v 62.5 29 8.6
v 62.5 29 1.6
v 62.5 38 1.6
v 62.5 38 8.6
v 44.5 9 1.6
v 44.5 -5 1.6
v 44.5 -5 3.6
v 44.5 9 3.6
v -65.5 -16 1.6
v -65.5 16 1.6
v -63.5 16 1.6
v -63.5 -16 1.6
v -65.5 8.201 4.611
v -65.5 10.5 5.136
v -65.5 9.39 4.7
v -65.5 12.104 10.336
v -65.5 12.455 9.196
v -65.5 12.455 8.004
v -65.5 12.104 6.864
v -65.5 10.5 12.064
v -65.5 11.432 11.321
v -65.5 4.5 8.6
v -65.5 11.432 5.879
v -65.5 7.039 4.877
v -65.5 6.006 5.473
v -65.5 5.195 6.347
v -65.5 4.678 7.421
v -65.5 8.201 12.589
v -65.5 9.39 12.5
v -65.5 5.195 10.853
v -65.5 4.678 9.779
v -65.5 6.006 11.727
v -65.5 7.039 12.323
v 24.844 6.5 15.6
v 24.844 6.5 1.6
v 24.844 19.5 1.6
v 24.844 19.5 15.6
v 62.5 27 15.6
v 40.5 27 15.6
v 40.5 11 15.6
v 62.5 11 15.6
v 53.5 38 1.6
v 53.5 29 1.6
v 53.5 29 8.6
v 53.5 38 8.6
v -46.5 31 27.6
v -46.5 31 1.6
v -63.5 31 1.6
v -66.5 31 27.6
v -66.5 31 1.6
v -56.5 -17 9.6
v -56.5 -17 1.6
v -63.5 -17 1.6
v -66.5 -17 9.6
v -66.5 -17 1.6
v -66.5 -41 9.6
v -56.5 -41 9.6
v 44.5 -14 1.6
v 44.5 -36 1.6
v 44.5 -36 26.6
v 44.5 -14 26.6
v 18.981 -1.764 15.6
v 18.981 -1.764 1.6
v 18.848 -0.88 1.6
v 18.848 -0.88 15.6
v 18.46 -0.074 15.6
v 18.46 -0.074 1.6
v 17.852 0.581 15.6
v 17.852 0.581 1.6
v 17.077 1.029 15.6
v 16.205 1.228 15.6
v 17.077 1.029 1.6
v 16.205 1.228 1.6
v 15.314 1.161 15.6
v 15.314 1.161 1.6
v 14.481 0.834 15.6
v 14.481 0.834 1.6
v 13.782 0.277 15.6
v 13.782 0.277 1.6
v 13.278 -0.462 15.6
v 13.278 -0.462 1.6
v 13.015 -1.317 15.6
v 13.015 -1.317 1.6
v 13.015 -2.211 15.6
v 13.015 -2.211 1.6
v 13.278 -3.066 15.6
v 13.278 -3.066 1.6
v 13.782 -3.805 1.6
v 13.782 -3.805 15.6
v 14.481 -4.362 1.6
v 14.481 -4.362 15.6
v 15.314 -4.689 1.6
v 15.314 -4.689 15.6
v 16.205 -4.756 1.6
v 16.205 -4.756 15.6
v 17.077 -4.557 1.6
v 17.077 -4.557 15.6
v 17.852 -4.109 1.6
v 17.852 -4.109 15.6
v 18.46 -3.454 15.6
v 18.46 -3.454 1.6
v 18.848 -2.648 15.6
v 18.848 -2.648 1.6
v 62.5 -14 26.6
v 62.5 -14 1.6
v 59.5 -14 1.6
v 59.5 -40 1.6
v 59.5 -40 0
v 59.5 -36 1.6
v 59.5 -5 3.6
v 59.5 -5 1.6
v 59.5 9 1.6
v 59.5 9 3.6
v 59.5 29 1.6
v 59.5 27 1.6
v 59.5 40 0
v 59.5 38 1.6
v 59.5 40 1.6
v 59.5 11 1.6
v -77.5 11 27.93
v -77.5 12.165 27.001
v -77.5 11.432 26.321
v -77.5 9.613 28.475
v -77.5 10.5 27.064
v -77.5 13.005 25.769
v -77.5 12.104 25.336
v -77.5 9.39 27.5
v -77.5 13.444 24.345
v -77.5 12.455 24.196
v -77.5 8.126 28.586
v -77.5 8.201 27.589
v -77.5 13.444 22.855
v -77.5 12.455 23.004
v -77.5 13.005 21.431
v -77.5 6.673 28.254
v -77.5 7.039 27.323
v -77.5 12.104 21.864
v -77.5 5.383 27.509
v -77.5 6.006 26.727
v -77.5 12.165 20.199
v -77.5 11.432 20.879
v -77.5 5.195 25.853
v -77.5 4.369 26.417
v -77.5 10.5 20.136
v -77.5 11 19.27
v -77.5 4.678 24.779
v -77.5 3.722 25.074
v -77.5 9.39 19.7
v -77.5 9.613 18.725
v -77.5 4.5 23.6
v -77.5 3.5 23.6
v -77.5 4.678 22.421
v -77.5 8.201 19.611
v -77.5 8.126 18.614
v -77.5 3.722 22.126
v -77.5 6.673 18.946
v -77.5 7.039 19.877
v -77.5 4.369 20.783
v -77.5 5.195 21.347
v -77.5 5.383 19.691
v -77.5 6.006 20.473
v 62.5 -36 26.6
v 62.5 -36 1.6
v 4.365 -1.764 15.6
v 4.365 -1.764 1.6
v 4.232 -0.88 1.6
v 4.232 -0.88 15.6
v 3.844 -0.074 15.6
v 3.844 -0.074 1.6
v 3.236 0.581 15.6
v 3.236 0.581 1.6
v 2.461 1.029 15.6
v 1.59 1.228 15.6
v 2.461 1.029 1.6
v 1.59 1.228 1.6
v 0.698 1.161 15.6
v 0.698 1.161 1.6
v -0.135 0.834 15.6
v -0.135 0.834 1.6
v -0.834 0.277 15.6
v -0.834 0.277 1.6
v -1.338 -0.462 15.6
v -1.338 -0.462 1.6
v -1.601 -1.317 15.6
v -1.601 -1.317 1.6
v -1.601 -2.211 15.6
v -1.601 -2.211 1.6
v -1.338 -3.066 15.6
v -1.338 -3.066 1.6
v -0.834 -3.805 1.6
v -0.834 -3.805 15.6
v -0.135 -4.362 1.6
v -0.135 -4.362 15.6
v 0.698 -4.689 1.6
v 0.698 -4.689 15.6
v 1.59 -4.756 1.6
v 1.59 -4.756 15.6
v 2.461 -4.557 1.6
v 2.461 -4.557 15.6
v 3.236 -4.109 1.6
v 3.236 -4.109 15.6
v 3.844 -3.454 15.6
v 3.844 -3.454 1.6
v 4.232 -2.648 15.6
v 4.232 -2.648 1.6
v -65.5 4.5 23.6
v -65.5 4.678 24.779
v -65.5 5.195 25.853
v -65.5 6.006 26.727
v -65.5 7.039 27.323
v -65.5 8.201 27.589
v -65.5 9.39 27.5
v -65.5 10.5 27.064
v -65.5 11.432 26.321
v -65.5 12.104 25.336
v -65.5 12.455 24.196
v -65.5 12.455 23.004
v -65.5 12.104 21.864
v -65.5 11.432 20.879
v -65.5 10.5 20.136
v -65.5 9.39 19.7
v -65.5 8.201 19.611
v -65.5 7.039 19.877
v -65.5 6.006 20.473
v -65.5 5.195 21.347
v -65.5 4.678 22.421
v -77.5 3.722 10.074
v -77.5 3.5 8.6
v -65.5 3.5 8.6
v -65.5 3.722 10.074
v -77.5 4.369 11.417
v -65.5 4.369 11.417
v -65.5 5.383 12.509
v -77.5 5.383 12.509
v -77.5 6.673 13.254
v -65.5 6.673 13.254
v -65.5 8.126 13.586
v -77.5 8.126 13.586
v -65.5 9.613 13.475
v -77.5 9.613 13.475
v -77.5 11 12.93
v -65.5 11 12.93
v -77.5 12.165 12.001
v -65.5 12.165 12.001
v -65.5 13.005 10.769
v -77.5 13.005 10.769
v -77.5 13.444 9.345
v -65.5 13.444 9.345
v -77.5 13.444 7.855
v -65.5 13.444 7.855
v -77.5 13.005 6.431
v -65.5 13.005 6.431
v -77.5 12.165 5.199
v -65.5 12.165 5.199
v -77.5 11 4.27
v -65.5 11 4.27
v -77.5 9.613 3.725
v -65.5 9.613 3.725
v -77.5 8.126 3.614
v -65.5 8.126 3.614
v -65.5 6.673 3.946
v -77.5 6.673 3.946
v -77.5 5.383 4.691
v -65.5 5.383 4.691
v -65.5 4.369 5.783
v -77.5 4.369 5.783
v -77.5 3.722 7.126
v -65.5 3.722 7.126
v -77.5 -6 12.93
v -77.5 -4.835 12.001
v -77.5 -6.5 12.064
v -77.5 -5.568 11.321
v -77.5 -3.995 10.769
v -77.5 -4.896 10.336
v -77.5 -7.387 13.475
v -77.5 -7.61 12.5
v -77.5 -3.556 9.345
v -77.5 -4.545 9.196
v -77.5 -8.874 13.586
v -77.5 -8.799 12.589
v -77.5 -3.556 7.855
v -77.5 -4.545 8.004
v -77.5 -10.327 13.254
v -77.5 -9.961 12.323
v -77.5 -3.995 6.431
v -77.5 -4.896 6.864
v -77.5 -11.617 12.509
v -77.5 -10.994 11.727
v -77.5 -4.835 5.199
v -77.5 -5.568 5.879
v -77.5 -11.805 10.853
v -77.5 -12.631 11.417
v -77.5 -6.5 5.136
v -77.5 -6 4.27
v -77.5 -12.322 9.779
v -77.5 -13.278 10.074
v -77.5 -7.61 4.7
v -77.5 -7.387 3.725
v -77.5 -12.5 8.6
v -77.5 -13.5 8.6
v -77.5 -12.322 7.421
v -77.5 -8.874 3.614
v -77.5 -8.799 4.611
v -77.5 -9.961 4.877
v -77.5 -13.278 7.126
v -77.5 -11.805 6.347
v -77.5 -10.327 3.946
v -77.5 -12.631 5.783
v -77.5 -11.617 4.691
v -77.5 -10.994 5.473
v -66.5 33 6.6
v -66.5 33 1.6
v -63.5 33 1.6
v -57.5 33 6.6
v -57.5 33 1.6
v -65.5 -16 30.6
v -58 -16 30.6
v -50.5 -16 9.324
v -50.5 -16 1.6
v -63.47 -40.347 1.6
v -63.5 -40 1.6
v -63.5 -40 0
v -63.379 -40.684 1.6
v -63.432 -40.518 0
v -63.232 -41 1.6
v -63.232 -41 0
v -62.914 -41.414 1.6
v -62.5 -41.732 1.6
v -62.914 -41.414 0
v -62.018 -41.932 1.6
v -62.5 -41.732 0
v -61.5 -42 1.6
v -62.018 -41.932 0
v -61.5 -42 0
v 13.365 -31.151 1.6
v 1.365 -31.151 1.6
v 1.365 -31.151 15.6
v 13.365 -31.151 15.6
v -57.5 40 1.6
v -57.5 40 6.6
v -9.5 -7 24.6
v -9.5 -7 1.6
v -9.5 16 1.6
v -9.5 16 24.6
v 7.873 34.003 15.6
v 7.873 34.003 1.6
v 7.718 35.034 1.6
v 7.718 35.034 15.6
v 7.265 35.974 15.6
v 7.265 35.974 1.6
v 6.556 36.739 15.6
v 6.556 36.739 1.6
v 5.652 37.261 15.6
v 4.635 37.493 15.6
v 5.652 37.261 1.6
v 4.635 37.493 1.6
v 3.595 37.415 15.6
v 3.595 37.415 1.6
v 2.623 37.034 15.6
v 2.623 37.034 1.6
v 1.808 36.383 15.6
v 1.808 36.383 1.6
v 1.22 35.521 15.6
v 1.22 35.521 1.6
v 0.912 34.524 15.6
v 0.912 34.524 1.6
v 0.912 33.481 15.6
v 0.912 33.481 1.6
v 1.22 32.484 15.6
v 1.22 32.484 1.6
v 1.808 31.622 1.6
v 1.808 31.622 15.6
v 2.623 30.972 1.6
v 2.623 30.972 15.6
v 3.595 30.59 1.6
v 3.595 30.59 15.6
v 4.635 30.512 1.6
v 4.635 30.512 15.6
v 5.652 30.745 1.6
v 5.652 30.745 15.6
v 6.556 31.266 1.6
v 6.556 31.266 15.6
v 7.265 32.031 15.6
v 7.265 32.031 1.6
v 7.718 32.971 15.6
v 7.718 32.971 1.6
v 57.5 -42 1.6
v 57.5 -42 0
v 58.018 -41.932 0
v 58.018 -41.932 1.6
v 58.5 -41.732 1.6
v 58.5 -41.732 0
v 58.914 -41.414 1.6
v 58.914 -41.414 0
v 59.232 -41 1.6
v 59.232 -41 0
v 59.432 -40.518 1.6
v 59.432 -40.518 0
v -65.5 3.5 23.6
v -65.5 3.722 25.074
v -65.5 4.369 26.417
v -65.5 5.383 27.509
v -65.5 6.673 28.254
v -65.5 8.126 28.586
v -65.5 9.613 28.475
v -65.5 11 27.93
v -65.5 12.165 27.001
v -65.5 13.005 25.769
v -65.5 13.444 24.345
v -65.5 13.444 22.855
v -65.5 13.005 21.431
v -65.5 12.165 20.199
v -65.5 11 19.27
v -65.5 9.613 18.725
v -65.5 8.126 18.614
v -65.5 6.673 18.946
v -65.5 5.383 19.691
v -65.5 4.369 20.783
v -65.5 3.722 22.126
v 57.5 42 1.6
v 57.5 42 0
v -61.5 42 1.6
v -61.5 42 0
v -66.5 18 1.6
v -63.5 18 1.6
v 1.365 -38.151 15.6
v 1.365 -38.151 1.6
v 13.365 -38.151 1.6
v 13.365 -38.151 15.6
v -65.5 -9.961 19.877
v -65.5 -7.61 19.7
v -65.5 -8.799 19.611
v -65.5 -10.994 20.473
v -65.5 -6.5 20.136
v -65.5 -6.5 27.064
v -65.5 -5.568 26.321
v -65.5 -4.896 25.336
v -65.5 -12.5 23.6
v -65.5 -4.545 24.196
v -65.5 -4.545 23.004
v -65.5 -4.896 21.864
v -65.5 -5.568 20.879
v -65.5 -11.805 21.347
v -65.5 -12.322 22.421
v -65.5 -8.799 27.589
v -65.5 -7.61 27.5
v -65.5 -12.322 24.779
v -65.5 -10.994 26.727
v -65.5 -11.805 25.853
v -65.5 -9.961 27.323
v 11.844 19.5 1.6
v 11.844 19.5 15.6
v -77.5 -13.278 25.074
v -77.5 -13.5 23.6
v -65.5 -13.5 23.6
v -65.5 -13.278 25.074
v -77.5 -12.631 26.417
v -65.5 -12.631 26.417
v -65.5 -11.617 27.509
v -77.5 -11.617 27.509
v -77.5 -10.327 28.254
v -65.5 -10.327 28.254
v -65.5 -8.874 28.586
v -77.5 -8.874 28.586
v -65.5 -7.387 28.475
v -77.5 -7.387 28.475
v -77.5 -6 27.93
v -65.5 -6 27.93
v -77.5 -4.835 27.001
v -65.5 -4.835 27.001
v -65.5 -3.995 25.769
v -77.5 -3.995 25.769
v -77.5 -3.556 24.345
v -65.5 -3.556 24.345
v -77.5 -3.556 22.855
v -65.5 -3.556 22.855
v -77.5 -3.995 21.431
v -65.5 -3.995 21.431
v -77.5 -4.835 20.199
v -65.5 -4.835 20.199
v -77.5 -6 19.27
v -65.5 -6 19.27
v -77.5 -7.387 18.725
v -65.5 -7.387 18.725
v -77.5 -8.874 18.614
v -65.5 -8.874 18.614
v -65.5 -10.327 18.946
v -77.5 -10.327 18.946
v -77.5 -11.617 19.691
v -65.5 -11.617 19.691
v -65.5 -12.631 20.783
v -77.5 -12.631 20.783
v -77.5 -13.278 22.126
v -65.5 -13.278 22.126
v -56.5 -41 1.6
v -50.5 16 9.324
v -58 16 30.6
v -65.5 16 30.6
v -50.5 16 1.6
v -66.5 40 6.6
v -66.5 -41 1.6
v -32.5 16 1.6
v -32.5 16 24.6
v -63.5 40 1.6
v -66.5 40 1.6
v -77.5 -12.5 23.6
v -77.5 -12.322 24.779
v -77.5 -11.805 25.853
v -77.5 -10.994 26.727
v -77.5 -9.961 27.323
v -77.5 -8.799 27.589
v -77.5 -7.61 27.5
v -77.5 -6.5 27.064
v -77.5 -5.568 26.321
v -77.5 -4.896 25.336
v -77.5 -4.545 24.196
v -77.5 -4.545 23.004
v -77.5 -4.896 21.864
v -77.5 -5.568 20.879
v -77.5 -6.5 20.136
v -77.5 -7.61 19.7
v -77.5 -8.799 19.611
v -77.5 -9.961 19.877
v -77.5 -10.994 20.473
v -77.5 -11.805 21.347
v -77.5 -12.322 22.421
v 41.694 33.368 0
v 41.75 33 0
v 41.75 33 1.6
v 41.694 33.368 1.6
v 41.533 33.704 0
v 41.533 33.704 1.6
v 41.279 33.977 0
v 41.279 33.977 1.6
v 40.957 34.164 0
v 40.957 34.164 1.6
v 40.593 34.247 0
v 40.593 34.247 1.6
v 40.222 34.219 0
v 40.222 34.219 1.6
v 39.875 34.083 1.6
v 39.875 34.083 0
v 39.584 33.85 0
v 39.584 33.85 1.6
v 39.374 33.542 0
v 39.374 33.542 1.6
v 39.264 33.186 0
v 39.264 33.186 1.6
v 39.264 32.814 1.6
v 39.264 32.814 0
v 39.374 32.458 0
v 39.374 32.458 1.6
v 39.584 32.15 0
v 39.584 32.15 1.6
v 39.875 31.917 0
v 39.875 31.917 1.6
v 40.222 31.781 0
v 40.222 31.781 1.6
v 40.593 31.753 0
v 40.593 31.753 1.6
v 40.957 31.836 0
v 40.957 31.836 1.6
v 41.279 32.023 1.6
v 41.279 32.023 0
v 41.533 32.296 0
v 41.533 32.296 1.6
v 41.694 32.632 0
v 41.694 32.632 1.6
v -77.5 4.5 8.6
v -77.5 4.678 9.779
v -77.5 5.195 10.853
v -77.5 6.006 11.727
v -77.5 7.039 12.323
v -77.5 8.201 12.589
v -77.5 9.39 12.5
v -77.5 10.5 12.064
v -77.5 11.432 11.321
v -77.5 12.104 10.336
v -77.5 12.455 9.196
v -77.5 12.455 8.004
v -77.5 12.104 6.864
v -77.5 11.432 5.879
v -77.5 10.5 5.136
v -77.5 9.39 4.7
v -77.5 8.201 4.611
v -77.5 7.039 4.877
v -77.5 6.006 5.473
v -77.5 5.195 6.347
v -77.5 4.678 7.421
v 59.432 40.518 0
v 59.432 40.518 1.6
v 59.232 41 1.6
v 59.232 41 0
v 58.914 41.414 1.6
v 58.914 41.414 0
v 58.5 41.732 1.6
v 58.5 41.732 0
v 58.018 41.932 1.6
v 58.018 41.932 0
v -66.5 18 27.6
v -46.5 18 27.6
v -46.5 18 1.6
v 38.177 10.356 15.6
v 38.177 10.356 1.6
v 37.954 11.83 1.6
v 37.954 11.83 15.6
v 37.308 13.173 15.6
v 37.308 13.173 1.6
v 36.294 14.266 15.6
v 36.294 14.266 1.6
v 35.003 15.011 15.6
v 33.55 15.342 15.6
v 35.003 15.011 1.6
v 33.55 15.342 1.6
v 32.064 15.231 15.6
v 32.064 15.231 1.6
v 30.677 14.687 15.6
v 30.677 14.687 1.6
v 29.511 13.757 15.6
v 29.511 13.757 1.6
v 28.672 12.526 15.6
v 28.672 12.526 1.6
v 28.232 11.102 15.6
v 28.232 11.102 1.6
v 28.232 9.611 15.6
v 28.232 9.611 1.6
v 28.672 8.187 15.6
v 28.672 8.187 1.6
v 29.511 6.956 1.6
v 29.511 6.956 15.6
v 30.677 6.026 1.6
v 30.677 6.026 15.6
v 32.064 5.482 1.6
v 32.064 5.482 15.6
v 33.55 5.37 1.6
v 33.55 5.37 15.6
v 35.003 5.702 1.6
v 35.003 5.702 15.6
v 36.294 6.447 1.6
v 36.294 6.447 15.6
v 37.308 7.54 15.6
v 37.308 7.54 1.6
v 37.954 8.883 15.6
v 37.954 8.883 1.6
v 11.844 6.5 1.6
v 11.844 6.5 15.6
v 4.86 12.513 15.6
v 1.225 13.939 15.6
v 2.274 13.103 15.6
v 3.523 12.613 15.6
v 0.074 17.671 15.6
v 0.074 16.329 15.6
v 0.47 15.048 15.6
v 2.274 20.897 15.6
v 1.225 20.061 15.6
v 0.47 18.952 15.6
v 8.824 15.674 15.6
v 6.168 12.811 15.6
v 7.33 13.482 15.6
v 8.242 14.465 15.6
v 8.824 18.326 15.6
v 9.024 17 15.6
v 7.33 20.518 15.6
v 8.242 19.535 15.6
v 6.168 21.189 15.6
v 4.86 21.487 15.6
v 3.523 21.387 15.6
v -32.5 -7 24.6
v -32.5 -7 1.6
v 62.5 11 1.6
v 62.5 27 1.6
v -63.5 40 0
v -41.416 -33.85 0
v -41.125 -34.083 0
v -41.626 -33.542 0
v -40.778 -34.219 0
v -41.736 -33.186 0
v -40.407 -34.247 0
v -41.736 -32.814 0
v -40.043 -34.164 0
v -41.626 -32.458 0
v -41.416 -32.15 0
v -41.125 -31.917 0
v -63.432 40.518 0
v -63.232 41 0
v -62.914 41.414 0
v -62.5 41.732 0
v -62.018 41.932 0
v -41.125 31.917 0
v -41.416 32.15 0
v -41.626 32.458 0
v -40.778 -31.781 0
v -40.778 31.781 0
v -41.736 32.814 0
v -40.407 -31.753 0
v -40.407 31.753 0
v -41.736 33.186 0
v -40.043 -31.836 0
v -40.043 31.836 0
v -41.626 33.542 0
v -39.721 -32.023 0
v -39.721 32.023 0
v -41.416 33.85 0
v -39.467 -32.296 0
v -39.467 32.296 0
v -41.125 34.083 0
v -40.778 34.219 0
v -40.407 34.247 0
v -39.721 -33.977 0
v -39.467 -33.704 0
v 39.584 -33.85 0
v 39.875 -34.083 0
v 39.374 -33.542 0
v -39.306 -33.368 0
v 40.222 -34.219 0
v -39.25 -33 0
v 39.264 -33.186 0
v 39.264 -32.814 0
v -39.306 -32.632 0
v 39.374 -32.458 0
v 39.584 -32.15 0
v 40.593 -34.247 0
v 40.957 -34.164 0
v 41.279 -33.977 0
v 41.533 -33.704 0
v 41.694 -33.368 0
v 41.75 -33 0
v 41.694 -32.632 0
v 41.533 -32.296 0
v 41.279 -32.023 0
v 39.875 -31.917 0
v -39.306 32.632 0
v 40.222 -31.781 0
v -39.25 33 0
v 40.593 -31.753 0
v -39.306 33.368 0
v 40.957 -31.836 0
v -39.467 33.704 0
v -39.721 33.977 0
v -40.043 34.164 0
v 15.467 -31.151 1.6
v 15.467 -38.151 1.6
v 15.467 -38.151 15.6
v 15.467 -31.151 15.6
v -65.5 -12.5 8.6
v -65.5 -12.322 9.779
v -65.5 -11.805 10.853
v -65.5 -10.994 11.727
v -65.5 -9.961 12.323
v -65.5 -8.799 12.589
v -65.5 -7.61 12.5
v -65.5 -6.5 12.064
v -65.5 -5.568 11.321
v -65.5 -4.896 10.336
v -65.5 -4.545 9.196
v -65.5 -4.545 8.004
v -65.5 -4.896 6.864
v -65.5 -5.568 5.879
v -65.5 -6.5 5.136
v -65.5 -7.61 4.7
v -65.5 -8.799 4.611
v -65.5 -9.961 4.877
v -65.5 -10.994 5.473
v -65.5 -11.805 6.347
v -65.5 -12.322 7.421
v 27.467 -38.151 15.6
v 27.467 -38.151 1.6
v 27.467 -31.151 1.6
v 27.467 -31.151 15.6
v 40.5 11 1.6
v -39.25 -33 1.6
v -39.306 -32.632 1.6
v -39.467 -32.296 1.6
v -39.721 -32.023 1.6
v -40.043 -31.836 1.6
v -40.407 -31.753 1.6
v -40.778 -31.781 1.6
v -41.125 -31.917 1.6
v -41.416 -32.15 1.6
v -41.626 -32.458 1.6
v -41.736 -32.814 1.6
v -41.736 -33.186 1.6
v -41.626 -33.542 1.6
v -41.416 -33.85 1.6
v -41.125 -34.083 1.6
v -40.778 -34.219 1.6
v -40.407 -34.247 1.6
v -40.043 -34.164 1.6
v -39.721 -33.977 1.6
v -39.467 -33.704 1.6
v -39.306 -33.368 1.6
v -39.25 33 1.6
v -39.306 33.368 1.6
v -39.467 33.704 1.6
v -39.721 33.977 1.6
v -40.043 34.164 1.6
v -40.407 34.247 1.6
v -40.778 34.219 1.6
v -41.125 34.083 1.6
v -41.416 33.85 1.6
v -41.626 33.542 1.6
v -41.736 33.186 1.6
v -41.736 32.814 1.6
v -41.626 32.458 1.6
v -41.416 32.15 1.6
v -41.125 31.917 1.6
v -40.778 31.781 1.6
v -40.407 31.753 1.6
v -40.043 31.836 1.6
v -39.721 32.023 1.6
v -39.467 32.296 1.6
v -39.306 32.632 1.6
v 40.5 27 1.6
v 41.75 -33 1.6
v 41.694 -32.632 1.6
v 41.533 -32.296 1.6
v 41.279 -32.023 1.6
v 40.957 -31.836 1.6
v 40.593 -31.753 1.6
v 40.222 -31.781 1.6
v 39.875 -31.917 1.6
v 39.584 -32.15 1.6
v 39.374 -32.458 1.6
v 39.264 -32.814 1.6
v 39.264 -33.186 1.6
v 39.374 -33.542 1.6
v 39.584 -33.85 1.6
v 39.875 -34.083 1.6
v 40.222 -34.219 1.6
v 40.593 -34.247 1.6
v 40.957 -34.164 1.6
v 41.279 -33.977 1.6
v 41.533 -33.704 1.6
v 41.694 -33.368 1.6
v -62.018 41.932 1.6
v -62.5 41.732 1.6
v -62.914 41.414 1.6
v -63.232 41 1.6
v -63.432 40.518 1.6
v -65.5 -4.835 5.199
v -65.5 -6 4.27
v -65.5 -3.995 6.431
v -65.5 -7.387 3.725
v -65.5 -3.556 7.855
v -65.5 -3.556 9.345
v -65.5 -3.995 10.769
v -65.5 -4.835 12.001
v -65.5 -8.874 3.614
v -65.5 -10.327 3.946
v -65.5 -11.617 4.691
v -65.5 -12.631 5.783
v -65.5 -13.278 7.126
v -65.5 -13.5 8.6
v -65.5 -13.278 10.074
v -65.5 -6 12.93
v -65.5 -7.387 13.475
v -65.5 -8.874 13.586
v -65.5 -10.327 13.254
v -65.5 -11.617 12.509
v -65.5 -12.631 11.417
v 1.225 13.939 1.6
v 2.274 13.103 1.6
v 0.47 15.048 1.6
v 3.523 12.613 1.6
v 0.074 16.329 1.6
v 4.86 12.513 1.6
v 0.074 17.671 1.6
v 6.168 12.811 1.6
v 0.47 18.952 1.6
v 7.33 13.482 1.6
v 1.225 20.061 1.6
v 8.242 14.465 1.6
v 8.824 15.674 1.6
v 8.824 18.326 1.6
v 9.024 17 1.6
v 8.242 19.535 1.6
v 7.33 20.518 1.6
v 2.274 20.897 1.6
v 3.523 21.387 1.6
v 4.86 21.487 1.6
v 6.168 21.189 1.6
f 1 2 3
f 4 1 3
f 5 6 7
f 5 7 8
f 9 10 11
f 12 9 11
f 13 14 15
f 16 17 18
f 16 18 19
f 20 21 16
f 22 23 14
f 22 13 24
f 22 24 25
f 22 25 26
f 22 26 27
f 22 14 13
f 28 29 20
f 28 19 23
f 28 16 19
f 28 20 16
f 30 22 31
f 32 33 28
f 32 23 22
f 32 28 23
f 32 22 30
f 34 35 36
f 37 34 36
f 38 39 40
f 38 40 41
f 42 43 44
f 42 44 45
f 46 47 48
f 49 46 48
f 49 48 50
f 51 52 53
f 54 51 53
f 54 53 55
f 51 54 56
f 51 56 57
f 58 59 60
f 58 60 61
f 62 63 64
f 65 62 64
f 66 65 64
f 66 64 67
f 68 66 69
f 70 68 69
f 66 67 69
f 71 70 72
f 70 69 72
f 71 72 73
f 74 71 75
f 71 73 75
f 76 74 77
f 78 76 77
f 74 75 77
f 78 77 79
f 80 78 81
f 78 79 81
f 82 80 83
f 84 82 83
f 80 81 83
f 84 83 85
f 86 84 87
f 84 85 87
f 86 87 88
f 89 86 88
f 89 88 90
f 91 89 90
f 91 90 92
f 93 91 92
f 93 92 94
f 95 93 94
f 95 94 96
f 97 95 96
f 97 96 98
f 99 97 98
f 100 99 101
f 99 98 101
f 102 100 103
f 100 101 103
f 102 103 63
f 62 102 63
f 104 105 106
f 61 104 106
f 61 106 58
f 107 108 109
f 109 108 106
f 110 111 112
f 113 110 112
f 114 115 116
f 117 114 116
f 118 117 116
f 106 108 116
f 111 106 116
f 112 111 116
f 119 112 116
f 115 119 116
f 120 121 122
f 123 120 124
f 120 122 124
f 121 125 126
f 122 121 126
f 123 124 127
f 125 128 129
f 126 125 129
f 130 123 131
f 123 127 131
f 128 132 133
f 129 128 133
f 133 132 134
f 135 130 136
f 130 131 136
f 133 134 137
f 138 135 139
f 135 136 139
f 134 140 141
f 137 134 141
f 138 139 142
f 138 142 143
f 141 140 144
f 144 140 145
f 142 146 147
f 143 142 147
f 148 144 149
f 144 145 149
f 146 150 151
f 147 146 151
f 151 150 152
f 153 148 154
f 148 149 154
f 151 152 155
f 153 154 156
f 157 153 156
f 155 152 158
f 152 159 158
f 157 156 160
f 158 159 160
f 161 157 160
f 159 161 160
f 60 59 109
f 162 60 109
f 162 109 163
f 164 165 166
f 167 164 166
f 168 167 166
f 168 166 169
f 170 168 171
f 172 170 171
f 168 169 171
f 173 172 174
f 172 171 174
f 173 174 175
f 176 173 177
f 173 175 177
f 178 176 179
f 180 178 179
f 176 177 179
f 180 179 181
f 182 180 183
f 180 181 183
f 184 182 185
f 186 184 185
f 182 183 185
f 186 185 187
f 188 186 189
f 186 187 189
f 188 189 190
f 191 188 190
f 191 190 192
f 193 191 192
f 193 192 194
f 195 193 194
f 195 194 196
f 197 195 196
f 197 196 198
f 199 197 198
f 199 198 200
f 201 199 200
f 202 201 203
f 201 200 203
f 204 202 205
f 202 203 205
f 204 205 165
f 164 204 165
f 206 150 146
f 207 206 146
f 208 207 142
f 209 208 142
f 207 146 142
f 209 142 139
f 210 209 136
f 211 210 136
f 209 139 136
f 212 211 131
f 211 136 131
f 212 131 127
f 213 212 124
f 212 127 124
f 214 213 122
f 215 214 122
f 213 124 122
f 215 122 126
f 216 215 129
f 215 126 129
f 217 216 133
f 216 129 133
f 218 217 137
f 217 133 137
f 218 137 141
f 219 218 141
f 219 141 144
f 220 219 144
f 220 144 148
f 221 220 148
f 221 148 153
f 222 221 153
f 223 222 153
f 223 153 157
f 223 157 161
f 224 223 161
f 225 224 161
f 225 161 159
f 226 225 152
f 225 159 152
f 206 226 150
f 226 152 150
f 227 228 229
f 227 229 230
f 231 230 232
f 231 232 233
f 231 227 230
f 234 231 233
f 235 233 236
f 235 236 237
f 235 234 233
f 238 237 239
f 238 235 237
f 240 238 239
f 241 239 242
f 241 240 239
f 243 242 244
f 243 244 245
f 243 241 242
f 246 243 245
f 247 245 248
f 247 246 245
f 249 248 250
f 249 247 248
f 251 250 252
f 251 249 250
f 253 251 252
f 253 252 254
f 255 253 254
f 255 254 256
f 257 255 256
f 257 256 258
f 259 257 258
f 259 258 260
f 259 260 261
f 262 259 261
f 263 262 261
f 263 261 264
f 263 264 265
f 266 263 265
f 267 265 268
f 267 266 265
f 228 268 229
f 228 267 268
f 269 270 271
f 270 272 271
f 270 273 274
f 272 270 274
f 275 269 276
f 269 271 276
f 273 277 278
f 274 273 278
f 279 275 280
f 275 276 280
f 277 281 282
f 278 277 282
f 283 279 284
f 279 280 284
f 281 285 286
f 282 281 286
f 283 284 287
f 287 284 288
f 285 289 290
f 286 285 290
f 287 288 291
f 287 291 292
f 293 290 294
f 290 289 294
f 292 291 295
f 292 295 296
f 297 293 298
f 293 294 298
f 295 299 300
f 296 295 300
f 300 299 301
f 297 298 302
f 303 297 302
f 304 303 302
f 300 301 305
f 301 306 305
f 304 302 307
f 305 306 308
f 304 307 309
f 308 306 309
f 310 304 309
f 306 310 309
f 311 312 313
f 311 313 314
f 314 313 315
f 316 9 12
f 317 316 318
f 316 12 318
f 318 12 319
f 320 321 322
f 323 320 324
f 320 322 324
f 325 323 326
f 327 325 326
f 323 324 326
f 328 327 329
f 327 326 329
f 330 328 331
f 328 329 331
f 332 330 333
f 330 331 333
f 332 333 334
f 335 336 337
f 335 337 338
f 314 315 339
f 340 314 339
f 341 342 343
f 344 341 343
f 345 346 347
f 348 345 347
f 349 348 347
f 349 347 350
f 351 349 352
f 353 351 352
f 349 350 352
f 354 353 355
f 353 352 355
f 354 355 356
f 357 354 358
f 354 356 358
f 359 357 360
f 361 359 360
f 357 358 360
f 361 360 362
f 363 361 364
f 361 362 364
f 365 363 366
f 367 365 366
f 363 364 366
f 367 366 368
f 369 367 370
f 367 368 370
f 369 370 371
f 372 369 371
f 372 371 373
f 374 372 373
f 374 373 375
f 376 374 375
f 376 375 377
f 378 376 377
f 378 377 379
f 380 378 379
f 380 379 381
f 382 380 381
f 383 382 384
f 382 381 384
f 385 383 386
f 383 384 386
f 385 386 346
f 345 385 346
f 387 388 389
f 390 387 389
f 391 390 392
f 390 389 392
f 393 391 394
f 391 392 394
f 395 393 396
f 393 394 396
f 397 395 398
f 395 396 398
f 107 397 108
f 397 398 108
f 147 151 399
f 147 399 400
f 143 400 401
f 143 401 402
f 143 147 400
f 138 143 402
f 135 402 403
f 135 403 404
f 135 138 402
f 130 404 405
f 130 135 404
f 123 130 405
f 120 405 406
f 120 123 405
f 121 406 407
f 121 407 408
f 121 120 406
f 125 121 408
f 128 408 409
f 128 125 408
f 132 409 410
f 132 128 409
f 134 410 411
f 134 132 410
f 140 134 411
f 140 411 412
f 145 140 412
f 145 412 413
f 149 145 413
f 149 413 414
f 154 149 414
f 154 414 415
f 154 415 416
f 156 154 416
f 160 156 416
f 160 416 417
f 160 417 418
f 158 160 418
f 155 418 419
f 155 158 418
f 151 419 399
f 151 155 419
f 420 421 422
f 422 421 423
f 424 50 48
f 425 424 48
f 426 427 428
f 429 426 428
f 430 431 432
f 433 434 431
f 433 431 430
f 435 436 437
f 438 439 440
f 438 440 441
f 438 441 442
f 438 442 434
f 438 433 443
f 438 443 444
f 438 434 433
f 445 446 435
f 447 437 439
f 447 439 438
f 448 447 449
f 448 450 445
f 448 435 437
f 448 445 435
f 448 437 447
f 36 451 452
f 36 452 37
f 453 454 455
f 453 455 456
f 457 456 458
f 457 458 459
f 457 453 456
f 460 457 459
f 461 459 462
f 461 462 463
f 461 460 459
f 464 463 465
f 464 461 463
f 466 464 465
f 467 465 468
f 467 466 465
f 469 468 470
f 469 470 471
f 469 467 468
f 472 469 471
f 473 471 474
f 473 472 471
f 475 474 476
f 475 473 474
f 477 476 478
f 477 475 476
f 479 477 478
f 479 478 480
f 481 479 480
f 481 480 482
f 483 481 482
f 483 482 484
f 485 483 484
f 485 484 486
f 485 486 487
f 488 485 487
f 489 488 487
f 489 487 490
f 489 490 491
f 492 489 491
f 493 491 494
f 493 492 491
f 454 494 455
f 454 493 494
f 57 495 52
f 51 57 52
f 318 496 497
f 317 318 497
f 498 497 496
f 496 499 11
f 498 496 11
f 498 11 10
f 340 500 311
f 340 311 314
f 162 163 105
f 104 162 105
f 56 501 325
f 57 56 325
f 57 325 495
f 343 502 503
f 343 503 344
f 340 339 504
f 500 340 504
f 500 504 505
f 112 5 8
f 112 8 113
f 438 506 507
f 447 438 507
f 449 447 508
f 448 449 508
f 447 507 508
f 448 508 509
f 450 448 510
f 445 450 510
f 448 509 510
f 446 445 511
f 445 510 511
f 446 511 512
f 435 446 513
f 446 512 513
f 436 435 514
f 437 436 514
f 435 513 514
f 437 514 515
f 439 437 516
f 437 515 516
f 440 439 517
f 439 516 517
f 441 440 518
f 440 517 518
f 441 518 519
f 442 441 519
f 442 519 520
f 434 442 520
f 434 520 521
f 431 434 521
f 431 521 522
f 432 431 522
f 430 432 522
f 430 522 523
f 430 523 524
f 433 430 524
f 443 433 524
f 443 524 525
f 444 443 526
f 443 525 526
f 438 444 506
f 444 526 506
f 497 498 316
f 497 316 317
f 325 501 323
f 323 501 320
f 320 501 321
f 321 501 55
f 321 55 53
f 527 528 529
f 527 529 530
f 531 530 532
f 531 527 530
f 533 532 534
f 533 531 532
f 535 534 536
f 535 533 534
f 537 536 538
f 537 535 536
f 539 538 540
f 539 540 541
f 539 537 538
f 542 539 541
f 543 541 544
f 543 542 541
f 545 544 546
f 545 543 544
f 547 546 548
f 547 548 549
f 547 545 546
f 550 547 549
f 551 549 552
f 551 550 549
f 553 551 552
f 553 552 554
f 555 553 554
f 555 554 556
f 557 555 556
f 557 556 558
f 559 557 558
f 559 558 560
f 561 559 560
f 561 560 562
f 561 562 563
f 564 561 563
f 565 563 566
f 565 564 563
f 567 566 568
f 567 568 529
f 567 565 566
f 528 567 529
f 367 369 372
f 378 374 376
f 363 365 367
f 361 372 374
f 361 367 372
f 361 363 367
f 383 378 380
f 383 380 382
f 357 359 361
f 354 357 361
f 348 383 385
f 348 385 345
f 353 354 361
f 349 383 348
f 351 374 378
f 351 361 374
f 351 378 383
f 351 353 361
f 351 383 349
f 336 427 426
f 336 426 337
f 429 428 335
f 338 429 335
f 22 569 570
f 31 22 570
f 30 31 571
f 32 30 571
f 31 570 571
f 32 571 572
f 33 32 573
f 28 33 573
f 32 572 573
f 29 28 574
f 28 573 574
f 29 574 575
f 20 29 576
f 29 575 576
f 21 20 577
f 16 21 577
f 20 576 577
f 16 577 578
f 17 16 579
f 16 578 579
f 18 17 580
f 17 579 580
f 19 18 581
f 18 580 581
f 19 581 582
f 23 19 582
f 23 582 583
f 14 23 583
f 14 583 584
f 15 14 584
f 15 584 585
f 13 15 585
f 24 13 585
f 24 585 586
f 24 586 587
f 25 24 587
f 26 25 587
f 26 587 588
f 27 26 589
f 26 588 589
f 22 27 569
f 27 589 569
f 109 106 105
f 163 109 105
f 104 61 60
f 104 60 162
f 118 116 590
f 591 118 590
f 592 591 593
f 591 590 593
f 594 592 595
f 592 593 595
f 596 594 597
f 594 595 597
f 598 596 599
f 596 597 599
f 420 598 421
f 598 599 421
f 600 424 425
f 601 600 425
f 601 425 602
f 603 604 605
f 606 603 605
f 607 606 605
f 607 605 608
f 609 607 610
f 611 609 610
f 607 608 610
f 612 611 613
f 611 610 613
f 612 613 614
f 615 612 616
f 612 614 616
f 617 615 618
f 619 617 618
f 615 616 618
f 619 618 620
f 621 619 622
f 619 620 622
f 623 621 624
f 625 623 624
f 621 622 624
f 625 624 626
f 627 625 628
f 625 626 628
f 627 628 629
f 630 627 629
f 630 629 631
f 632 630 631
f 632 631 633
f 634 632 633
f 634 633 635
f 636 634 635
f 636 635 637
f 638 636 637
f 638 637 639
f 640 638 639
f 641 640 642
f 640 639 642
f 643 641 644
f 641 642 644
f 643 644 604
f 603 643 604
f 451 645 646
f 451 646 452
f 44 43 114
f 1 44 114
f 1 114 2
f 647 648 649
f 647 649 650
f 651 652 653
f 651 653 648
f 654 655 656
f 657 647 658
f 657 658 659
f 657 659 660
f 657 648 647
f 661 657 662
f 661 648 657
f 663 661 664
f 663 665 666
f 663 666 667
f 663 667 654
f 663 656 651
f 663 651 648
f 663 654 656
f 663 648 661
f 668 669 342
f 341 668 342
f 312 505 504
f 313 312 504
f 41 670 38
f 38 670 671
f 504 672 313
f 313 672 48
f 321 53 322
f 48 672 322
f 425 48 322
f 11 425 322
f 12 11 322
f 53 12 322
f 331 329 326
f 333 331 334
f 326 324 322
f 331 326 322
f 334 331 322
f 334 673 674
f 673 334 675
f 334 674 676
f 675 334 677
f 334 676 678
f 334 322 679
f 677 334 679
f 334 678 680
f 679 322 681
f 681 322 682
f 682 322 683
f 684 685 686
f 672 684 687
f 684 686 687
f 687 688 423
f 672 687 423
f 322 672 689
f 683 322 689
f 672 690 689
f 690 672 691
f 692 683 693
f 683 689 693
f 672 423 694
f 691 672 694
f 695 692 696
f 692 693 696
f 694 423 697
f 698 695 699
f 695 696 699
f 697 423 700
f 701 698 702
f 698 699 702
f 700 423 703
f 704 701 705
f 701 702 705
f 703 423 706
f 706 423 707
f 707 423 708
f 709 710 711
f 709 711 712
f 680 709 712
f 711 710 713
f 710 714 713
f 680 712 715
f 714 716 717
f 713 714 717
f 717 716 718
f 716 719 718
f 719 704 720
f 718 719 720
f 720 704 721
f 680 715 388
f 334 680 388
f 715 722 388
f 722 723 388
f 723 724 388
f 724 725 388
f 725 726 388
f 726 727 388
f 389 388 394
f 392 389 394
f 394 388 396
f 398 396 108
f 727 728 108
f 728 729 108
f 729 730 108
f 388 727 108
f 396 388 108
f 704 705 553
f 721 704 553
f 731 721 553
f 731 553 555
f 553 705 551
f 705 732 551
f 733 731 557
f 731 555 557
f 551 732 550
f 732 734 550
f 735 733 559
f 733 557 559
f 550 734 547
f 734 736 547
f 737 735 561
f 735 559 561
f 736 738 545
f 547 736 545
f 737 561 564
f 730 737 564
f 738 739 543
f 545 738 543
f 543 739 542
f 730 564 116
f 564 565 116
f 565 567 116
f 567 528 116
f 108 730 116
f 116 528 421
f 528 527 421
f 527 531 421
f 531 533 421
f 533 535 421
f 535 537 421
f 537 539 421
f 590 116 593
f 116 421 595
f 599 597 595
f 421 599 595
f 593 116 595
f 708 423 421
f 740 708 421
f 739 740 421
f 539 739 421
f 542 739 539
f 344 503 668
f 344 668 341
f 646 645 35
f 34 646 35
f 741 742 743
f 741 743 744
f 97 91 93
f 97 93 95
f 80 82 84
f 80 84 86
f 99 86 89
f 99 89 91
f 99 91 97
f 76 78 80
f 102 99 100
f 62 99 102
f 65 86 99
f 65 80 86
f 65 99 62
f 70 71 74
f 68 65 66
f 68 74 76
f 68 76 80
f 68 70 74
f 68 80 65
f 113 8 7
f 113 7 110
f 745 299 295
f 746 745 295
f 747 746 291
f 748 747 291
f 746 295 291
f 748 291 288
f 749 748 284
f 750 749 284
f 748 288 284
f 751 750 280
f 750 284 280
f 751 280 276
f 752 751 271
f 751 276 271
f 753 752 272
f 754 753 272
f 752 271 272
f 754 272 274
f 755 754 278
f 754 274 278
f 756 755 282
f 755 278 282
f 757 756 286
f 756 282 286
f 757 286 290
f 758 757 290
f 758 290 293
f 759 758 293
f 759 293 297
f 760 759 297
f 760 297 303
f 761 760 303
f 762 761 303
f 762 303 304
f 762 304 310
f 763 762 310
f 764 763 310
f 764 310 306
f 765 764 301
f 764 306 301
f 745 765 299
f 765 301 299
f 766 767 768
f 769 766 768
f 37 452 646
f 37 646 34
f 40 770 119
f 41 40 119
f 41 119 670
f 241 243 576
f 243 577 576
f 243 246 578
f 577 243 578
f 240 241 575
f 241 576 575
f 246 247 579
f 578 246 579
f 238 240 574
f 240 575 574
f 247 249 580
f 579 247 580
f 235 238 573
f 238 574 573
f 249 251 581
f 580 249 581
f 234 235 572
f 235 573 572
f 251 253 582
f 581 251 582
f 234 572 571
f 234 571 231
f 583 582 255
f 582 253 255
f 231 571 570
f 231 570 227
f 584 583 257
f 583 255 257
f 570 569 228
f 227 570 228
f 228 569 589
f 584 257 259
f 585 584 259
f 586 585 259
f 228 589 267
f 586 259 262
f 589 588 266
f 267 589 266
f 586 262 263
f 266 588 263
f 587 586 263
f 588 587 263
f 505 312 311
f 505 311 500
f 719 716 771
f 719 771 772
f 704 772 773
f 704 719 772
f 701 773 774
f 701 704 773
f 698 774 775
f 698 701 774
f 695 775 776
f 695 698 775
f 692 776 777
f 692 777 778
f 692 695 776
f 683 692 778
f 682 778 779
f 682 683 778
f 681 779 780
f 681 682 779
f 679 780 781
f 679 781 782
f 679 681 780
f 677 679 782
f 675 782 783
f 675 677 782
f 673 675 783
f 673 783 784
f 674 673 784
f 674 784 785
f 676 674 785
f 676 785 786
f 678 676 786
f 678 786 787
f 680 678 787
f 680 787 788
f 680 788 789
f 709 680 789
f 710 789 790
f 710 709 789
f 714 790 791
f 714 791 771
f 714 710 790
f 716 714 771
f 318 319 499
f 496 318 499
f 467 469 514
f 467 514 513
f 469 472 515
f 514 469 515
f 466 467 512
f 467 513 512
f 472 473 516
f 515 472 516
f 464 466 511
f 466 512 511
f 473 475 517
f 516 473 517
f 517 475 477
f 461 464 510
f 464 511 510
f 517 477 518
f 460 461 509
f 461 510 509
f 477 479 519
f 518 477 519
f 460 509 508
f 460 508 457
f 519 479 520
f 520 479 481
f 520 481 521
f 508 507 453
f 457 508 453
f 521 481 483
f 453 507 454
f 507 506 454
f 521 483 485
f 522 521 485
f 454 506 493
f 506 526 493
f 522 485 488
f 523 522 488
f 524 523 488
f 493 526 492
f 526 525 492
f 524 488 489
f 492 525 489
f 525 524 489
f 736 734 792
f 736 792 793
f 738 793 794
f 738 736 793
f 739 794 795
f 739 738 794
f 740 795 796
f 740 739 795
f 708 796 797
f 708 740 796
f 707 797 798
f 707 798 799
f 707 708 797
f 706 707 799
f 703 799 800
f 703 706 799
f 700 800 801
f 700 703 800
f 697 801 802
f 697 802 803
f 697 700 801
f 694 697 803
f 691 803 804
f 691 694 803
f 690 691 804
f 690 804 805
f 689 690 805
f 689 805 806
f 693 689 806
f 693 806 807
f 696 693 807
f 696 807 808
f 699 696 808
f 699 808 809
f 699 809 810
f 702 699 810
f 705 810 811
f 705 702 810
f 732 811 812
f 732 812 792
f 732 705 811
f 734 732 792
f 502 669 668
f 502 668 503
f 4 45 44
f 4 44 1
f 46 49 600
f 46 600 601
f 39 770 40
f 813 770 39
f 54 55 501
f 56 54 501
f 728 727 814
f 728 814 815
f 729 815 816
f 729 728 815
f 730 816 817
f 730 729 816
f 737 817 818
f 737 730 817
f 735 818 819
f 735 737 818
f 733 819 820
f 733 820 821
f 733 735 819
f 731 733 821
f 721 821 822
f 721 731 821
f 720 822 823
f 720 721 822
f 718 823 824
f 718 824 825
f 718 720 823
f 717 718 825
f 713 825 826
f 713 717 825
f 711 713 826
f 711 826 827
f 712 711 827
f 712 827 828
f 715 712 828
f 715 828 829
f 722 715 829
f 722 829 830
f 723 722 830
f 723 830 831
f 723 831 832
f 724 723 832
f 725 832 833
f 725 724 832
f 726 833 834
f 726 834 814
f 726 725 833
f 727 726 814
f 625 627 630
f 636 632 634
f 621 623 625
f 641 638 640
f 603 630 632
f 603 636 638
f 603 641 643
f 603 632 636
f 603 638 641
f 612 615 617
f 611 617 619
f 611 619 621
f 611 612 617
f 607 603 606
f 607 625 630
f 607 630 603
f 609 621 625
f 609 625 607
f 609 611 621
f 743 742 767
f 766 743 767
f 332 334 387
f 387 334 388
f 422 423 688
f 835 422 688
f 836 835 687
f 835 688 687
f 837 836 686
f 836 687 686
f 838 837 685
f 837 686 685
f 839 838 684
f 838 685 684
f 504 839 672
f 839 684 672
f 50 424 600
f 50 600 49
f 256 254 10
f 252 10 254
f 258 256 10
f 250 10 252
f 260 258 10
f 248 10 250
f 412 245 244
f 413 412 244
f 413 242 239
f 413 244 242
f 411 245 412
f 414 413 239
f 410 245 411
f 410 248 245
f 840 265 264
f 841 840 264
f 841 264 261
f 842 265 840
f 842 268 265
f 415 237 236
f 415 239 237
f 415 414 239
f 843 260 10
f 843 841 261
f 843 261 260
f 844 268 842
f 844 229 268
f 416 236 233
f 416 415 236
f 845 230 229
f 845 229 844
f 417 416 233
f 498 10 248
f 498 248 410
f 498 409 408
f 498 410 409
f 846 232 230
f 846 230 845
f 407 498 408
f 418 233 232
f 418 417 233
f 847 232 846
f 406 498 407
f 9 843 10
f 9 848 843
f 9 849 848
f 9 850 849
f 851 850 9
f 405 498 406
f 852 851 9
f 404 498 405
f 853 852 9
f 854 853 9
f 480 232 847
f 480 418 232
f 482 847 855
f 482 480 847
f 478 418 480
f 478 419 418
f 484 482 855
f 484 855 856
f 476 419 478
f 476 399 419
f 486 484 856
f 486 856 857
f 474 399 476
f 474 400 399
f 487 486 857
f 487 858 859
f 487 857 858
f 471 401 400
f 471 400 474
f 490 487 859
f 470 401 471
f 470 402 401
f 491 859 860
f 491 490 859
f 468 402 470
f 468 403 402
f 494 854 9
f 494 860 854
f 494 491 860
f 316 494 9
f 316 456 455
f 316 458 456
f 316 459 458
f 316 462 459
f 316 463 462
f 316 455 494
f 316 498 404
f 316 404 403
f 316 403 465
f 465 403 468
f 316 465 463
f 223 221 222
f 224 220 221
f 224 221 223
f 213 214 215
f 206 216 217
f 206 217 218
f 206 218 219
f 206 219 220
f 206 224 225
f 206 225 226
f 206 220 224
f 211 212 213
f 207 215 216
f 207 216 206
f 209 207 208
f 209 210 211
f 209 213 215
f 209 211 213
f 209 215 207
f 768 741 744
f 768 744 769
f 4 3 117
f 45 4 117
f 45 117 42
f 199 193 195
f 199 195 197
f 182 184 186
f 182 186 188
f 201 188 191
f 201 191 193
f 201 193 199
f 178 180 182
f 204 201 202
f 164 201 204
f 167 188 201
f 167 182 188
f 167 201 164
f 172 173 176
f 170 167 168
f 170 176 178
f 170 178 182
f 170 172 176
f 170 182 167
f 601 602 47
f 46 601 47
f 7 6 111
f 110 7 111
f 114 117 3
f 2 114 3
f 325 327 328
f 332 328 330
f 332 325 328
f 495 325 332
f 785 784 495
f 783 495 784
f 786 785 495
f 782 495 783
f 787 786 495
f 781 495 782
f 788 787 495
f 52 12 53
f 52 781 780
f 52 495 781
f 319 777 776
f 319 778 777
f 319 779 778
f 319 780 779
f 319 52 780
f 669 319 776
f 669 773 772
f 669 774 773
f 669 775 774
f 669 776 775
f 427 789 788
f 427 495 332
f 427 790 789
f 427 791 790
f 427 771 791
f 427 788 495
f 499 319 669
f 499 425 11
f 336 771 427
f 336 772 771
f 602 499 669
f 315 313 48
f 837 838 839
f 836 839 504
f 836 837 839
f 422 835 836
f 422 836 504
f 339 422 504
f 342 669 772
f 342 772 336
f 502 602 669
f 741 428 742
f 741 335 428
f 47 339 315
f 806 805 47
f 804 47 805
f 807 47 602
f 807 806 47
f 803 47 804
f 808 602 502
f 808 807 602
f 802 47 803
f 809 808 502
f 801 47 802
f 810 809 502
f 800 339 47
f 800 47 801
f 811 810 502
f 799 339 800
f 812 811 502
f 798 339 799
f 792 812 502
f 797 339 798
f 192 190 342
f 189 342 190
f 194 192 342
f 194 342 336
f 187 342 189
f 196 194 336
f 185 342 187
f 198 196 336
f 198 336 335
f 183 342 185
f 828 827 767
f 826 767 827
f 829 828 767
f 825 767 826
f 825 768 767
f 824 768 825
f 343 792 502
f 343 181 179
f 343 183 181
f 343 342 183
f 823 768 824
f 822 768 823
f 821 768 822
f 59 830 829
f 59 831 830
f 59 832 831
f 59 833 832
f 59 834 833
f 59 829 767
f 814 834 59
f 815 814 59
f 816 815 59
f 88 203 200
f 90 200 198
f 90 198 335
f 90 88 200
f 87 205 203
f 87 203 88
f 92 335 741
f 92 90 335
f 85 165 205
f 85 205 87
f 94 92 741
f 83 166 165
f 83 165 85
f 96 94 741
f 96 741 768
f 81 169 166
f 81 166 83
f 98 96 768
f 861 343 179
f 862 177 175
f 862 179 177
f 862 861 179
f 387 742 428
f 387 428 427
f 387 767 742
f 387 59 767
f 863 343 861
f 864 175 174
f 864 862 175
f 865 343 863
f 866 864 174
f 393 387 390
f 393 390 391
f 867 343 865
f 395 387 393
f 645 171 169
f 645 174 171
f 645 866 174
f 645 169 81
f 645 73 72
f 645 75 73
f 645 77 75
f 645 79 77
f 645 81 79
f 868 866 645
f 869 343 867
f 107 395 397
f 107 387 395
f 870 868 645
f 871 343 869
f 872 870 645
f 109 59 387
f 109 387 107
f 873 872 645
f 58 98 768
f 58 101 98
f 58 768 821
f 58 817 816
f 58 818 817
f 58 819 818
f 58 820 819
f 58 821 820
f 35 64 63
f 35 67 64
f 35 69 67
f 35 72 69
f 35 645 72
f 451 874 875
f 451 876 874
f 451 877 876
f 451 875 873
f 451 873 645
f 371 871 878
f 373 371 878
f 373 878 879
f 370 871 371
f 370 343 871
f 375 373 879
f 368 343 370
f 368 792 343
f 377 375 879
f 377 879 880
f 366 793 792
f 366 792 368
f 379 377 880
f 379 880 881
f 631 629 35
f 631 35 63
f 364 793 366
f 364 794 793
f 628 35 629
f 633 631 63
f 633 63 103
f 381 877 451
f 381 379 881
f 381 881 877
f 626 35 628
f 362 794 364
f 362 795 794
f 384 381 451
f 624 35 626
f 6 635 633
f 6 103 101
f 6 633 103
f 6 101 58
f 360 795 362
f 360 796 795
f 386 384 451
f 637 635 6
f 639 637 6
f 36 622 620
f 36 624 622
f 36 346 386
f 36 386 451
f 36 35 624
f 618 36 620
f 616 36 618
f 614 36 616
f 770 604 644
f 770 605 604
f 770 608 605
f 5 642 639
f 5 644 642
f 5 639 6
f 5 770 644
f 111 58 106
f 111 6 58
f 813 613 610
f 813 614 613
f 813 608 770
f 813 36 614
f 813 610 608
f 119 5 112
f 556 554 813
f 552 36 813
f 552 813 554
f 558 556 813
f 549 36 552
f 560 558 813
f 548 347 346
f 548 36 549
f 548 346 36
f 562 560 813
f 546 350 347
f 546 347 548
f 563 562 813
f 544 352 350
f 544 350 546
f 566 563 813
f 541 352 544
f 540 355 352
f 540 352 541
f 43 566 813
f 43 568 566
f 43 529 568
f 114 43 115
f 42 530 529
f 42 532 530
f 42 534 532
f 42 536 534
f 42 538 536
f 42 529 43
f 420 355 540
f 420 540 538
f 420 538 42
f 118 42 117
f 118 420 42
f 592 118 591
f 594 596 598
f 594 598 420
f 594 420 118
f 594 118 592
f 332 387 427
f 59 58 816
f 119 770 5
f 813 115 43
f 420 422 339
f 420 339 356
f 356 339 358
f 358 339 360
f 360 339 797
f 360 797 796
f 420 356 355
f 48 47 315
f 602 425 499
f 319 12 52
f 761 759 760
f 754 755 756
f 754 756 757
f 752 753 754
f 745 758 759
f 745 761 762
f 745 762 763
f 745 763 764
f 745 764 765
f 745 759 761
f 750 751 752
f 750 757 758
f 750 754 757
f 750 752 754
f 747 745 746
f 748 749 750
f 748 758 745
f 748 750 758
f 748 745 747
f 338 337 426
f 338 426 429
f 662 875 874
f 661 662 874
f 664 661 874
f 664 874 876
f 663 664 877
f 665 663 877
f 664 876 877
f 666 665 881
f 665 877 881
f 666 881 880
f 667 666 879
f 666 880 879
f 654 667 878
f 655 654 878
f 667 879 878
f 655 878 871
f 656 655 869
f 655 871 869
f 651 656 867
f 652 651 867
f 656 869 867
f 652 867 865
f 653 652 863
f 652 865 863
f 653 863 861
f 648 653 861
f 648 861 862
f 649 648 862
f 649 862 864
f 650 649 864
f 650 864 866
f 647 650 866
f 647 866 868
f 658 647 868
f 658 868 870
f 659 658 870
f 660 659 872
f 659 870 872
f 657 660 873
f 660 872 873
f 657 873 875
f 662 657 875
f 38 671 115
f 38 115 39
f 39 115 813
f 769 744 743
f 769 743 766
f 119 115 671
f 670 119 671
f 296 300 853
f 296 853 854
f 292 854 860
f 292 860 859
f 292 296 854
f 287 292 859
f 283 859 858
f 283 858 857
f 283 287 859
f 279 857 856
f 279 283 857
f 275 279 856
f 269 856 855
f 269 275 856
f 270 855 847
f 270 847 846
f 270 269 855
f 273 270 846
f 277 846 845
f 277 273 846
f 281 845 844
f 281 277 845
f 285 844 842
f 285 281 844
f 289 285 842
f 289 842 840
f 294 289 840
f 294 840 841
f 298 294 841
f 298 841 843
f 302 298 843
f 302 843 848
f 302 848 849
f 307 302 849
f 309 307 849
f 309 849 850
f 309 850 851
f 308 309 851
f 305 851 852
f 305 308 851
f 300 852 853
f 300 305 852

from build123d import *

# Parameters (mm, degrees)
F0_R      = 1.25
F1_DEPTH  = 1.6
F2_W      = 3
F2_H      = 7
F2_W_2    = 6
F3_DEPTH  = 5
F4_DEPTH  = 8
F2_W_3    = 14
F2_H_2    = 16
F2_W_4    = 13
F5_DEPTH  = 29
F6_W      = 32
F6_H      = 29
F6_R      = 5
F6_R_2    = 4
F7_DEPTH  = 12
F9_DEPTH  = 32
F2_H_3    = 13
F2_W_5    = 17
F10_DEPTH = 26
F2_H_4    = 9
F11_DEPTH = 7
F2_W_6    = 19
F2_R      = 3.5
F2_R_2    = 4.5
F2_R_3    = 5
F2_R_4    = 3
F2_W_7    = 12
F12_DEPTH = 14
F2_W_8    = 15
F2_H_5    = 14
F13_DEPTH = 2
F2_H_6    = 22
F14_DEPTH = 25
F2_W_9    = 23
F2_H_7    = 23
F15_DEPTH = 23


with BuildPart() as f1:
    # F0 (on Top) → F1 (new body)
    with BuildSketch(Plane.XY):
        with BuildLine():
            Line((57.5, 42), (-61.5, 42))
            ThreePointArc((-61.5, 42), (-62.914214, 41.414214), (-63.5, 40))
            Line((-63.5, 40), (-63.5, -40))
            ThreePointArc((-63.5, -40), (-62.914214, -41.414214), (-61.5, -42))
            Line((-61.5, -42), (57.5, -42))
            ThreePointArc((57.5, -42), (58.914214, -41.414214), (59.5, -40))
            Line((59.5, -40), (59.5, 40))
            ThreePointArc((59.5, 40), (58.914214, 41.414214), (57.5, 42))
        make_face()
        with Locations((-40.5, -33)):
            Circle(F0_R, mode=Mode.SUBTRACT)
        with Locations((40.5, -33)):
            Circle(F0_R, mode=Mode.SUBTRACT)
        with Locations((-40.5, 33)):
            Circle(F0_R, mode=Mode.SUBTRACT)
        with Locations((40.5, 33)):
            Circle(F0_R, mode=Mode.SUBTRACT)
    extrude(amount=F1_DEPTH)

    # F2 (on face) → F3 (join)
    with BuildSketch(Plane.XY.offset(1.6)):
        with Locations((-65, 36.5)):
            Rectangle(F2_W, F2_H)
        with Locations((-60.5, 36.5)):
            Rectangle(F2_W_2, F2_H)
    extrude(amount=F3_DEPTH)

    # F2 (on face) → F4 (join)
    with BuildSketch(Plane.XY.offset(1.6)):
        with BuildLine():
            Line((-56.5, -17), (-63.5, -17))
            Line((-63.5, -17), (-63.5, -40))
            ThreePointArc((-63.5, -40), (-63.431852, -40.517638), (-63.232051, -41))
            Line((-63.232051, -41), (-56.5, -41))
            Line((-56.5, -41), (-56.5, -17))
        make_face()
        with BuildLine():
            Line((-63.5, -40), (-63.5, -17))
            Line((-63.5, -17), (-66.5, -17))
            Line((-66.5, -17), (-66.5, -41))
            Line((-66.5, -41), (-63.232051, -41))
            ThreePointArc((-63.232051, -41), (-63.431852, -40.517638), (-63.5, -40))
        make_face()
    extrude(amount=F4_DEPTH)

    # F2 (on face) → F5 (join)
    with BuildSketch(Plane.XY.offset(1.6)):
        with Locations((-70.5, 8)):
            Rectangle(F2_W_3, F2_H_2)
        with Locations((-57, 8)):
            Rectangle(F2_W_4, F2_H_2)
        with Locations((-70.5, -8)):
            Rectangle(F2_W_3, F2_H_2)
        with Locations((-57, -8)):
            Rectangle(F2_W_4, F2_H_2)
    extrude(amount=F5_DEPTH)

    # F6 (on face) → F7 (cut)
    with BuildSketch(Plane(origin=(-77.5, 0, 0), x_dir=(0, -1, 0), z_dir=(-1, 0, 0))):
        with Locations((0, 16.1)):
            Rectangle(F6_W, F6_H)
        with Locations((-8.5, 8.6)):
            Circle(F6_R, mode=Mode.SUBTRACT)
        with Locations((8.5, 8.6)):
            Circle(F6_R, mode=Mode.SUBTRACT)
        with Locations((-8.5, 23.6)):
            Circle(F6_R, mode=Mode.SUBTRACT)
        with Locations((8.5, 23.6)):
            Circle(F6_R, mode=Mode.SUBTRACT)
        with Locations((-8.5, 23.6)):
            Circle(F6_R_2)
        with Locations((8.5, 23.6)):
            Circle(F6_R_2)
        with Locations((-8.5, 8.6)):
            Circle(F6_R_2)
        with Locations((8.5, 8.6)):
            Circle(F6_R_2)
    extrude(amount=-F7_DEPTH, mode=Mode.SUBTRACT)

    # F8 (on face) → F9 (cut, through all)
    with BuildSketch(Plane(origin=(0, 16, 0), x_dir=(-1, 0, 0), z_dir=(0, 1, 0))):
        Polygon((50.5, 9.324275), (58, 30.6), (50.5, 30.6), align=None)
    extrude(amount=-F9_DEPTH, mode=Mode.SUBTRACT)

    # F2 (on face) → F10 (join)
    with BuildSketch(Plane.XY.offset(1.6)):
        with Locations((-65, 24.5)):
            Rectangle(F2_W, F2_H_3)
        with Locations((-55, 24.5)):
            Rectangle(F2_W_5, F2_H_3)
    extrude(amount=F10_DEPTH)

    # F2 (on face) → F11 (join)
    with BuildSketch(Plane.XY.offset(1.6)):
        with Locations((56.5, 33.5)):
            Rectangle(F2_W_2, F2_H_4)
        with Locations((61, 33.5)):
            Rectangle(F2_W, F2_H_4)
    extrude(amount=F11_DEPTH)

    # F2 (on face) → F12 (join)
    with BuildSketch(Plane.XY.offset(1.6)):
        with Locations((50, 19)):
            Rectangle(F2_W_6, F2_H_2)
        with Locations((61, 19)):
            Rectangle(F2_W, F2_H_2)
        with Locations((4.373364, 34.002684)):
            Circle(F2_R)
        with Locations((4.524074, 17)):
            Circle(F2_R_2)
        with Locations((18.344349, 13)):
            Rectangle(F2_W_4, F2_H_3)
        with Locations((33.176582, 10.356459)):
            Circle(F2_R_3)
        with Locations((15.981103, -1.763999)):
            Circle(F2_R_4)
        with Locations((1.36537, -1.763999)):
            Circle(F2_R_4)
        with Locations((7.36537, -34.65119)):
            Rectangle(F2_W_7, F2_H)
        with Locations((21.466679, -34.65119)):
            Rectangle(F2_W_7, F2_H)
    extrude(amount=F12_DEPTH)

    # F2 (on face) → F13 (join)
    with BuildSketch(Plane.XY.offset(1.6)):
        with Locations((52, 2)):
            Rectangle(F2_W_8, F2_H_5)
    extrude(amount=F13_DEPTH)

    # F2 (on face) → F14 (join)
    with BuildSketch(Plane.XY.offset(1.6)):
        with Locations((52, -25)):
            Rectangle(F2_W_8, F2_H_6)
        with Locations((61, -25)):
            Rectangle(F2_W, F2_H_6)
    extrude(amount=F14_DEPTH)

    # F2 (on face) → F15 (join)
    with BuildSketch(Plane.XY.offset(1.6)):
        with Locations((-21, 4.5)):
            Rectangle(F2_W_9, F2_H_7)
    extrude(amount=F15_DEPTH)


solid = f1.part
